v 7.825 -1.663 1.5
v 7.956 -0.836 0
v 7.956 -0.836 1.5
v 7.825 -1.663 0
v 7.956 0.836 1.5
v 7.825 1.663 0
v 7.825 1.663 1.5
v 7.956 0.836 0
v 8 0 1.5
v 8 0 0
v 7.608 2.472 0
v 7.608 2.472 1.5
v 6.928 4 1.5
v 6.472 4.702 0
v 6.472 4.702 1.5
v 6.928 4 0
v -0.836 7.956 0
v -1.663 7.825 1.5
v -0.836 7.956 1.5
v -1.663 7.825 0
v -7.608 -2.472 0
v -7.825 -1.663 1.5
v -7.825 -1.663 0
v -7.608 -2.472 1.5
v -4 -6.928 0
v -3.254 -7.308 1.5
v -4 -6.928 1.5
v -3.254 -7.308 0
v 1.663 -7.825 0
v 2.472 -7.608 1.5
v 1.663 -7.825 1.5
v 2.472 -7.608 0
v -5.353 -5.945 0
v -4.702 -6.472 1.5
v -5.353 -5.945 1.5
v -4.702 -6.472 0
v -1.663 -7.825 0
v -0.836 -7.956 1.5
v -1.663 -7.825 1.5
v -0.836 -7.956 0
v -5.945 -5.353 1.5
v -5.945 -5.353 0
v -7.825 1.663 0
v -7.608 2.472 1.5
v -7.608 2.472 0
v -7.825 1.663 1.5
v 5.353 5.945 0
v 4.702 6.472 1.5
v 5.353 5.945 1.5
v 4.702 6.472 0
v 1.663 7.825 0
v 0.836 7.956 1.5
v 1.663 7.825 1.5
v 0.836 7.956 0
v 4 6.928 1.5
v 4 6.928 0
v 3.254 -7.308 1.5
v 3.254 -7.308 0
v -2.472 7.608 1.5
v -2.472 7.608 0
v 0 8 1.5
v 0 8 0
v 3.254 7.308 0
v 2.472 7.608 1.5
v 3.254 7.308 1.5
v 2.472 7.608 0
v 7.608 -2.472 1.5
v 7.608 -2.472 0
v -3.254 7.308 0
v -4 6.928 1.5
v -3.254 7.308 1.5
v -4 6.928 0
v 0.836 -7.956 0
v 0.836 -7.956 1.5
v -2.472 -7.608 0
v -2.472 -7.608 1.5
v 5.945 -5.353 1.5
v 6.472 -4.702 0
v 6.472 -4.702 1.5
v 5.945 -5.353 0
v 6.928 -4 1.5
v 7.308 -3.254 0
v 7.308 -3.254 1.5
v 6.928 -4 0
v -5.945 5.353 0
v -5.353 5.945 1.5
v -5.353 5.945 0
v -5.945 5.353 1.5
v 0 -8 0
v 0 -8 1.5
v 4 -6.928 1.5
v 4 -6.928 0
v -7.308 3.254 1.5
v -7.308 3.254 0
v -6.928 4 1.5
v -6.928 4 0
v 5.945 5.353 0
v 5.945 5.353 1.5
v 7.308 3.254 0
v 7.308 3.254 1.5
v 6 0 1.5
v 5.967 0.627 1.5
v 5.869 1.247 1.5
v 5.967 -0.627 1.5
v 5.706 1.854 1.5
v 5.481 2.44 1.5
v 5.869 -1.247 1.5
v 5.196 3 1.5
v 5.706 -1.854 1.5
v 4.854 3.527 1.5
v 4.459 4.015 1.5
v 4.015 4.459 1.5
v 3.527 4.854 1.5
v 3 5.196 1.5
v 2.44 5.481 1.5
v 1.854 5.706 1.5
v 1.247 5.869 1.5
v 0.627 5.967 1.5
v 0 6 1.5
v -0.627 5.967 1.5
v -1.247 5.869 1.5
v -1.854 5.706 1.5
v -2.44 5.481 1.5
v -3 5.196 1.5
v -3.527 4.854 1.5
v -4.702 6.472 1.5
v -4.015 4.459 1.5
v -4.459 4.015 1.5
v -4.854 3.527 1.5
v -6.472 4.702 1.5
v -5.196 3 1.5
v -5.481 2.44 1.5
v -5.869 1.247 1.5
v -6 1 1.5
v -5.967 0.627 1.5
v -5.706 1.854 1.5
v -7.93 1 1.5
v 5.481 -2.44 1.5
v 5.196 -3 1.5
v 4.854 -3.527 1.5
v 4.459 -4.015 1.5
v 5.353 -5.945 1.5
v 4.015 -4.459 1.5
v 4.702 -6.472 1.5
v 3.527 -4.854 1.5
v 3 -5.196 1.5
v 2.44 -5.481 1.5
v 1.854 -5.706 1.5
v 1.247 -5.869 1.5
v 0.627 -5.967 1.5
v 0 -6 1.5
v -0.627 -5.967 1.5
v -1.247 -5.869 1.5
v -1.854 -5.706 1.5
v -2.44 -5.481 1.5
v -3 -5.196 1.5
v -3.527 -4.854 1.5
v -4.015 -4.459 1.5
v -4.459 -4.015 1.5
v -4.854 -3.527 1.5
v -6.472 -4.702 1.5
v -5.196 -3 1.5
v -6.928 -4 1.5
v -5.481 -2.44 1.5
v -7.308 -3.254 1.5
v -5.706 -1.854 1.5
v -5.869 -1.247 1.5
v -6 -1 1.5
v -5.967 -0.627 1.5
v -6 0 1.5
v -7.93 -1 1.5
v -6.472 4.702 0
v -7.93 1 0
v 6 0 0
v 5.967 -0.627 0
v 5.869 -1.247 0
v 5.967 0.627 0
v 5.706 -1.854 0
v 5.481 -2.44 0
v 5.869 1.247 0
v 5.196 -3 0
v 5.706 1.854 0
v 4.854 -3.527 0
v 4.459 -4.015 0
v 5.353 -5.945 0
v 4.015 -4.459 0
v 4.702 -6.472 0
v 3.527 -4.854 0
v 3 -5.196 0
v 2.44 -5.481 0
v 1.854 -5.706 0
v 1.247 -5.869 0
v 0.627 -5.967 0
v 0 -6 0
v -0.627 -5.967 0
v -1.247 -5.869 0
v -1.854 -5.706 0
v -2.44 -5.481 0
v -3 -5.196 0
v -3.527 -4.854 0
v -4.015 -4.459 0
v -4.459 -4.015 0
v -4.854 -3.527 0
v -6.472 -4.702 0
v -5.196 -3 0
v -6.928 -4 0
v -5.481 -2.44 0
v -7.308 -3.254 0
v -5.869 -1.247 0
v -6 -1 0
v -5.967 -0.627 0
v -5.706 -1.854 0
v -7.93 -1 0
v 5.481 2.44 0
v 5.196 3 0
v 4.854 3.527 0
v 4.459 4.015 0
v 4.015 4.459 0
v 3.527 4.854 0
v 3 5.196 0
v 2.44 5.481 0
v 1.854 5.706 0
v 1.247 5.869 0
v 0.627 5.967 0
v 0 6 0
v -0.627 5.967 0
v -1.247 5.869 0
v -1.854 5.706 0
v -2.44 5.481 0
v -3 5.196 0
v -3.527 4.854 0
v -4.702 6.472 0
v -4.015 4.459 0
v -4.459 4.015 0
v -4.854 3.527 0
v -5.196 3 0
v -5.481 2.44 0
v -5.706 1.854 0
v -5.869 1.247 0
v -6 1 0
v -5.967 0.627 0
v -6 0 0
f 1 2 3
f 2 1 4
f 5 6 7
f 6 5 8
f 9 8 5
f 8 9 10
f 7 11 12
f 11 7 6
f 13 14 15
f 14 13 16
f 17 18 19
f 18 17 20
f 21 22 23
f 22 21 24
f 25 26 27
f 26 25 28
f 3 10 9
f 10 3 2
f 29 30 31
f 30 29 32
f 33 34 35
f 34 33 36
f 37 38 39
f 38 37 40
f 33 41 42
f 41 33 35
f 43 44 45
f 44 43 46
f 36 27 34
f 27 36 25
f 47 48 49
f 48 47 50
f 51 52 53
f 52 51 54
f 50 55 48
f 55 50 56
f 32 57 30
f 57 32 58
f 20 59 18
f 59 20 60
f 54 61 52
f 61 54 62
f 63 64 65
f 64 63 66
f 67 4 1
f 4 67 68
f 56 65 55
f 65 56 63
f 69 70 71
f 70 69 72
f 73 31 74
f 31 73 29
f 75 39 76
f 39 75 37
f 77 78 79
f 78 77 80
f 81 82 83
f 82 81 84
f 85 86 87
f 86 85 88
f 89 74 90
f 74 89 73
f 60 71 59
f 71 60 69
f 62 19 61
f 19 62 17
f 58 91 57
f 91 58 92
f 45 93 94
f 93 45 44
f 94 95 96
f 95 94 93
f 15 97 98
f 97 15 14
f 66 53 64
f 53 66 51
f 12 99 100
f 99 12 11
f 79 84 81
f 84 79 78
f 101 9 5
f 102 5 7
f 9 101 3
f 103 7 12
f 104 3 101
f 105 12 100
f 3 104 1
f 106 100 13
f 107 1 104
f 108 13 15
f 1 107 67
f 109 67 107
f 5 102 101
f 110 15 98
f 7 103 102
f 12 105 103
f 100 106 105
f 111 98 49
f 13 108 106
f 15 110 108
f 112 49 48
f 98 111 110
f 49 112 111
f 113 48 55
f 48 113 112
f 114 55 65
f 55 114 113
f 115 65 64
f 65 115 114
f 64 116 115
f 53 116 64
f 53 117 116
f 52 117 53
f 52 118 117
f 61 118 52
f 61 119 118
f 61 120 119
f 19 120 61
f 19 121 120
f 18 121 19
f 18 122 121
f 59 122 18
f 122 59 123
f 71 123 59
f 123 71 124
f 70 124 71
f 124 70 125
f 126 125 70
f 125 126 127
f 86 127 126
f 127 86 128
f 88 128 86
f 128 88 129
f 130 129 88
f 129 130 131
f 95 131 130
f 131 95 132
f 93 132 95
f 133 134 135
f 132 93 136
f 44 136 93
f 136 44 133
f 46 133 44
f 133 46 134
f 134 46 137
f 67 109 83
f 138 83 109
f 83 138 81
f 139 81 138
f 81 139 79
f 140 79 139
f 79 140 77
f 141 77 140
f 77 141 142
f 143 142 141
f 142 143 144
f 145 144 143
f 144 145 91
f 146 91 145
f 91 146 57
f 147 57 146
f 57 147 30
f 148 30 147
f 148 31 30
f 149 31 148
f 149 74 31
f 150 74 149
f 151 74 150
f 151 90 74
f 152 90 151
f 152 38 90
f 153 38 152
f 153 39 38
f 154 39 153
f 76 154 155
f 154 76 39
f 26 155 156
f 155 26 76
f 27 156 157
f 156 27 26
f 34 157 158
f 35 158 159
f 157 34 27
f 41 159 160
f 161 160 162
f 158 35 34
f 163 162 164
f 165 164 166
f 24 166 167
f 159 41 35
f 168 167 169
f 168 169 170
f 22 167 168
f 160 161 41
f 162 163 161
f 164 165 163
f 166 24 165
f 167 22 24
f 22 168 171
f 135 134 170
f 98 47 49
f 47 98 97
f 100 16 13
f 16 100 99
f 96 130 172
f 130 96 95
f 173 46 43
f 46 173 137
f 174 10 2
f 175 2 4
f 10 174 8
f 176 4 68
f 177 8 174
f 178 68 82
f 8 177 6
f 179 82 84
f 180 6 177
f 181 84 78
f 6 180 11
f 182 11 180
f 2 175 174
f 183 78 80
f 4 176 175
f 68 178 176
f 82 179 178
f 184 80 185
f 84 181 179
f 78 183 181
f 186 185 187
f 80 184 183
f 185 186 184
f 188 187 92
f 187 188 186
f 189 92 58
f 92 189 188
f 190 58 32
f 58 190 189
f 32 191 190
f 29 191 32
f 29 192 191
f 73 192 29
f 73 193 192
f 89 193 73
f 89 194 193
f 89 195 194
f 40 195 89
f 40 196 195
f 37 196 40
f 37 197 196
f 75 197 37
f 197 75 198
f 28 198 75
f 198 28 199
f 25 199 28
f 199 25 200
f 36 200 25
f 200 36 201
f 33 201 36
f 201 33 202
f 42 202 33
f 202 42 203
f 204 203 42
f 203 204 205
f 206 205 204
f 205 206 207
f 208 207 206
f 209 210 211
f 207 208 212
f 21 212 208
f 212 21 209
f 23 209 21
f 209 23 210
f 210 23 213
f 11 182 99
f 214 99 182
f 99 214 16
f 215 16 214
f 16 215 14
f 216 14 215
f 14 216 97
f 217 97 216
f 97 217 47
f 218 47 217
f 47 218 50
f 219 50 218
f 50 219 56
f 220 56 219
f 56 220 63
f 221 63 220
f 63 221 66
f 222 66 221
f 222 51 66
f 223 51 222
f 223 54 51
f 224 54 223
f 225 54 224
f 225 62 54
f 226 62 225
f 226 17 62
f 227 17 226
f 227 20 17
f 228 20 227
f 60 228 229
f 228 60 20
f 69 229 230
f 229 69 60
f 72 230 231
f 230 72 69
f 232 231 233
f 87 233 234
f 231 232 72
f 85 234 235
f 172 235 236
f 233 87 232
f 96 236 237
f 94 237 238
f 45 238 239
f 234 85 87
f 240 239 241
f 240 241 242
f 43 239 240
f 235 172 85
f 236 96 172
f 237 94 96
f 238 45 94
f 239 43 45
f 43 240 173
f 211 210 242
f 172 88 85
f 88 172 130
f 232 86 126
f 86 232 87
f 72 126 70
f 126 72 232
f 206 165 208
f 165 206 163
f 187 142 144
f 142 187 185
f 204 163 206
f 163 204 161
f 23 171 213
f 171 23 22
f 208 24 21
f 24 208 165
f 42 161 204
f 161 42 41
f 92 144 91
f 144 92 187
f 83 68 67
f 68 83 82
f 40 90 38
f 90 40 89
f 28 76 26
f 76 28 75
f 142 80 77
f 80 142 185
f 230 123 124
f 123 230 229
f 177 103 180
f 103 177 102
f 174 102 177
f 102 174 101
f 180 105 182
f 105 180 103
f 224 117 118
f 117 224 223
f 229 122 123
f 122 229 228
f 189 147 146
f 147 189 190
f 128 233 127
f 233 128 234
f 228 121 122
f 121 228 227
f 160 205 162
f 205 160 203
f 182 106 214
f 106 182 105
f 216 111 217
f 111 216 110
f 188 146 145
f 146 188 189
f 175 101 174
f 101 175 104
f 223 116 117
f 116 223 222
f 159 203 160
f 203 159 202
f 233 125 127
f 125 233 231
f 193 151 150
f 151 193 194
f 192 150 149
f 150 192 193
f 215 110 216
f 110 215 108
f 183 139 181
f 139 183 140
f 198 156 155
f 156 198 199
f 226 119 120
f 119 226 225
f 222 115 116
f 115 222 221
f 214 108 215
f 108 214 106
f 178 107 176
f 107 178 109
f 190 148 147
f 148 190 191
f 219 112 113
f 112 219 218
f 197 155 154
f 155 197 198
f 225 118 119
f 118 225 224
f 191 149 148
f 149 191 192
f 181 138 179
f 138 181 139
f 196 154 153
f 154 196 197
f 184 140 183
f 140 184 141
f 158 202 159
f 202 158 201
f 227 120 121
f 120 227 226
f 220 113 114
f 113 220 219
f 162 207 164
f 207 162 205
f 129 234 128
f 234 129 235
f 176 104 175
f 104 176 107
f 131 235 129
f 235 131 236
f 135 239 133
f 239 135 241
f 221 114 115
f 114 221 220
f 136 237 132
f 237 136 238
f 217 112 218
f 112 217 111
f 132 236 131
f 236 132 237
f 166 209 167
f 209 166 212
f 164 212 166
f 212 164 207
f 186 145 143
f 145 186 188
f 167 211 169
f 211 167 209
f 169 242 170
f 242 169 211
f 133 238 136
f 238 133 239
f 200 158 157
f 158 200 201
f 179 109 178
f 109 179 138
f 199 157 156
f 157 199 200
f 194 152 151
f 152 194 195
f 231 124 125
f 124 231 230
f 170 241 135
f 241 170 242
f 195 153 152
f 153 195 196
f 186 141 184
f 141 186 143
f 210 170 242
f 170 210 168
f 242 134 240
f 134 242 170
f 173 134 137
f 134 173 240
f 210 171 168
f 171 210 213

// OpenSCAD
// Internal retaining ring.
$fn = 60;
eps = 0.02;
inner_d = 12;
outer_d = 16;
thickness = max(1, 1.5);
difference() { cylinder(d=outer_d,h=thickness); translate([0,0,-eps]) cylinder(d=inner_d,h=thickness+2*eps); translate([-outer_d/2-eps,-1,-eps]) cube([outer_d/2-inner_d/2+eps,2,thickness+2*eps]); }
